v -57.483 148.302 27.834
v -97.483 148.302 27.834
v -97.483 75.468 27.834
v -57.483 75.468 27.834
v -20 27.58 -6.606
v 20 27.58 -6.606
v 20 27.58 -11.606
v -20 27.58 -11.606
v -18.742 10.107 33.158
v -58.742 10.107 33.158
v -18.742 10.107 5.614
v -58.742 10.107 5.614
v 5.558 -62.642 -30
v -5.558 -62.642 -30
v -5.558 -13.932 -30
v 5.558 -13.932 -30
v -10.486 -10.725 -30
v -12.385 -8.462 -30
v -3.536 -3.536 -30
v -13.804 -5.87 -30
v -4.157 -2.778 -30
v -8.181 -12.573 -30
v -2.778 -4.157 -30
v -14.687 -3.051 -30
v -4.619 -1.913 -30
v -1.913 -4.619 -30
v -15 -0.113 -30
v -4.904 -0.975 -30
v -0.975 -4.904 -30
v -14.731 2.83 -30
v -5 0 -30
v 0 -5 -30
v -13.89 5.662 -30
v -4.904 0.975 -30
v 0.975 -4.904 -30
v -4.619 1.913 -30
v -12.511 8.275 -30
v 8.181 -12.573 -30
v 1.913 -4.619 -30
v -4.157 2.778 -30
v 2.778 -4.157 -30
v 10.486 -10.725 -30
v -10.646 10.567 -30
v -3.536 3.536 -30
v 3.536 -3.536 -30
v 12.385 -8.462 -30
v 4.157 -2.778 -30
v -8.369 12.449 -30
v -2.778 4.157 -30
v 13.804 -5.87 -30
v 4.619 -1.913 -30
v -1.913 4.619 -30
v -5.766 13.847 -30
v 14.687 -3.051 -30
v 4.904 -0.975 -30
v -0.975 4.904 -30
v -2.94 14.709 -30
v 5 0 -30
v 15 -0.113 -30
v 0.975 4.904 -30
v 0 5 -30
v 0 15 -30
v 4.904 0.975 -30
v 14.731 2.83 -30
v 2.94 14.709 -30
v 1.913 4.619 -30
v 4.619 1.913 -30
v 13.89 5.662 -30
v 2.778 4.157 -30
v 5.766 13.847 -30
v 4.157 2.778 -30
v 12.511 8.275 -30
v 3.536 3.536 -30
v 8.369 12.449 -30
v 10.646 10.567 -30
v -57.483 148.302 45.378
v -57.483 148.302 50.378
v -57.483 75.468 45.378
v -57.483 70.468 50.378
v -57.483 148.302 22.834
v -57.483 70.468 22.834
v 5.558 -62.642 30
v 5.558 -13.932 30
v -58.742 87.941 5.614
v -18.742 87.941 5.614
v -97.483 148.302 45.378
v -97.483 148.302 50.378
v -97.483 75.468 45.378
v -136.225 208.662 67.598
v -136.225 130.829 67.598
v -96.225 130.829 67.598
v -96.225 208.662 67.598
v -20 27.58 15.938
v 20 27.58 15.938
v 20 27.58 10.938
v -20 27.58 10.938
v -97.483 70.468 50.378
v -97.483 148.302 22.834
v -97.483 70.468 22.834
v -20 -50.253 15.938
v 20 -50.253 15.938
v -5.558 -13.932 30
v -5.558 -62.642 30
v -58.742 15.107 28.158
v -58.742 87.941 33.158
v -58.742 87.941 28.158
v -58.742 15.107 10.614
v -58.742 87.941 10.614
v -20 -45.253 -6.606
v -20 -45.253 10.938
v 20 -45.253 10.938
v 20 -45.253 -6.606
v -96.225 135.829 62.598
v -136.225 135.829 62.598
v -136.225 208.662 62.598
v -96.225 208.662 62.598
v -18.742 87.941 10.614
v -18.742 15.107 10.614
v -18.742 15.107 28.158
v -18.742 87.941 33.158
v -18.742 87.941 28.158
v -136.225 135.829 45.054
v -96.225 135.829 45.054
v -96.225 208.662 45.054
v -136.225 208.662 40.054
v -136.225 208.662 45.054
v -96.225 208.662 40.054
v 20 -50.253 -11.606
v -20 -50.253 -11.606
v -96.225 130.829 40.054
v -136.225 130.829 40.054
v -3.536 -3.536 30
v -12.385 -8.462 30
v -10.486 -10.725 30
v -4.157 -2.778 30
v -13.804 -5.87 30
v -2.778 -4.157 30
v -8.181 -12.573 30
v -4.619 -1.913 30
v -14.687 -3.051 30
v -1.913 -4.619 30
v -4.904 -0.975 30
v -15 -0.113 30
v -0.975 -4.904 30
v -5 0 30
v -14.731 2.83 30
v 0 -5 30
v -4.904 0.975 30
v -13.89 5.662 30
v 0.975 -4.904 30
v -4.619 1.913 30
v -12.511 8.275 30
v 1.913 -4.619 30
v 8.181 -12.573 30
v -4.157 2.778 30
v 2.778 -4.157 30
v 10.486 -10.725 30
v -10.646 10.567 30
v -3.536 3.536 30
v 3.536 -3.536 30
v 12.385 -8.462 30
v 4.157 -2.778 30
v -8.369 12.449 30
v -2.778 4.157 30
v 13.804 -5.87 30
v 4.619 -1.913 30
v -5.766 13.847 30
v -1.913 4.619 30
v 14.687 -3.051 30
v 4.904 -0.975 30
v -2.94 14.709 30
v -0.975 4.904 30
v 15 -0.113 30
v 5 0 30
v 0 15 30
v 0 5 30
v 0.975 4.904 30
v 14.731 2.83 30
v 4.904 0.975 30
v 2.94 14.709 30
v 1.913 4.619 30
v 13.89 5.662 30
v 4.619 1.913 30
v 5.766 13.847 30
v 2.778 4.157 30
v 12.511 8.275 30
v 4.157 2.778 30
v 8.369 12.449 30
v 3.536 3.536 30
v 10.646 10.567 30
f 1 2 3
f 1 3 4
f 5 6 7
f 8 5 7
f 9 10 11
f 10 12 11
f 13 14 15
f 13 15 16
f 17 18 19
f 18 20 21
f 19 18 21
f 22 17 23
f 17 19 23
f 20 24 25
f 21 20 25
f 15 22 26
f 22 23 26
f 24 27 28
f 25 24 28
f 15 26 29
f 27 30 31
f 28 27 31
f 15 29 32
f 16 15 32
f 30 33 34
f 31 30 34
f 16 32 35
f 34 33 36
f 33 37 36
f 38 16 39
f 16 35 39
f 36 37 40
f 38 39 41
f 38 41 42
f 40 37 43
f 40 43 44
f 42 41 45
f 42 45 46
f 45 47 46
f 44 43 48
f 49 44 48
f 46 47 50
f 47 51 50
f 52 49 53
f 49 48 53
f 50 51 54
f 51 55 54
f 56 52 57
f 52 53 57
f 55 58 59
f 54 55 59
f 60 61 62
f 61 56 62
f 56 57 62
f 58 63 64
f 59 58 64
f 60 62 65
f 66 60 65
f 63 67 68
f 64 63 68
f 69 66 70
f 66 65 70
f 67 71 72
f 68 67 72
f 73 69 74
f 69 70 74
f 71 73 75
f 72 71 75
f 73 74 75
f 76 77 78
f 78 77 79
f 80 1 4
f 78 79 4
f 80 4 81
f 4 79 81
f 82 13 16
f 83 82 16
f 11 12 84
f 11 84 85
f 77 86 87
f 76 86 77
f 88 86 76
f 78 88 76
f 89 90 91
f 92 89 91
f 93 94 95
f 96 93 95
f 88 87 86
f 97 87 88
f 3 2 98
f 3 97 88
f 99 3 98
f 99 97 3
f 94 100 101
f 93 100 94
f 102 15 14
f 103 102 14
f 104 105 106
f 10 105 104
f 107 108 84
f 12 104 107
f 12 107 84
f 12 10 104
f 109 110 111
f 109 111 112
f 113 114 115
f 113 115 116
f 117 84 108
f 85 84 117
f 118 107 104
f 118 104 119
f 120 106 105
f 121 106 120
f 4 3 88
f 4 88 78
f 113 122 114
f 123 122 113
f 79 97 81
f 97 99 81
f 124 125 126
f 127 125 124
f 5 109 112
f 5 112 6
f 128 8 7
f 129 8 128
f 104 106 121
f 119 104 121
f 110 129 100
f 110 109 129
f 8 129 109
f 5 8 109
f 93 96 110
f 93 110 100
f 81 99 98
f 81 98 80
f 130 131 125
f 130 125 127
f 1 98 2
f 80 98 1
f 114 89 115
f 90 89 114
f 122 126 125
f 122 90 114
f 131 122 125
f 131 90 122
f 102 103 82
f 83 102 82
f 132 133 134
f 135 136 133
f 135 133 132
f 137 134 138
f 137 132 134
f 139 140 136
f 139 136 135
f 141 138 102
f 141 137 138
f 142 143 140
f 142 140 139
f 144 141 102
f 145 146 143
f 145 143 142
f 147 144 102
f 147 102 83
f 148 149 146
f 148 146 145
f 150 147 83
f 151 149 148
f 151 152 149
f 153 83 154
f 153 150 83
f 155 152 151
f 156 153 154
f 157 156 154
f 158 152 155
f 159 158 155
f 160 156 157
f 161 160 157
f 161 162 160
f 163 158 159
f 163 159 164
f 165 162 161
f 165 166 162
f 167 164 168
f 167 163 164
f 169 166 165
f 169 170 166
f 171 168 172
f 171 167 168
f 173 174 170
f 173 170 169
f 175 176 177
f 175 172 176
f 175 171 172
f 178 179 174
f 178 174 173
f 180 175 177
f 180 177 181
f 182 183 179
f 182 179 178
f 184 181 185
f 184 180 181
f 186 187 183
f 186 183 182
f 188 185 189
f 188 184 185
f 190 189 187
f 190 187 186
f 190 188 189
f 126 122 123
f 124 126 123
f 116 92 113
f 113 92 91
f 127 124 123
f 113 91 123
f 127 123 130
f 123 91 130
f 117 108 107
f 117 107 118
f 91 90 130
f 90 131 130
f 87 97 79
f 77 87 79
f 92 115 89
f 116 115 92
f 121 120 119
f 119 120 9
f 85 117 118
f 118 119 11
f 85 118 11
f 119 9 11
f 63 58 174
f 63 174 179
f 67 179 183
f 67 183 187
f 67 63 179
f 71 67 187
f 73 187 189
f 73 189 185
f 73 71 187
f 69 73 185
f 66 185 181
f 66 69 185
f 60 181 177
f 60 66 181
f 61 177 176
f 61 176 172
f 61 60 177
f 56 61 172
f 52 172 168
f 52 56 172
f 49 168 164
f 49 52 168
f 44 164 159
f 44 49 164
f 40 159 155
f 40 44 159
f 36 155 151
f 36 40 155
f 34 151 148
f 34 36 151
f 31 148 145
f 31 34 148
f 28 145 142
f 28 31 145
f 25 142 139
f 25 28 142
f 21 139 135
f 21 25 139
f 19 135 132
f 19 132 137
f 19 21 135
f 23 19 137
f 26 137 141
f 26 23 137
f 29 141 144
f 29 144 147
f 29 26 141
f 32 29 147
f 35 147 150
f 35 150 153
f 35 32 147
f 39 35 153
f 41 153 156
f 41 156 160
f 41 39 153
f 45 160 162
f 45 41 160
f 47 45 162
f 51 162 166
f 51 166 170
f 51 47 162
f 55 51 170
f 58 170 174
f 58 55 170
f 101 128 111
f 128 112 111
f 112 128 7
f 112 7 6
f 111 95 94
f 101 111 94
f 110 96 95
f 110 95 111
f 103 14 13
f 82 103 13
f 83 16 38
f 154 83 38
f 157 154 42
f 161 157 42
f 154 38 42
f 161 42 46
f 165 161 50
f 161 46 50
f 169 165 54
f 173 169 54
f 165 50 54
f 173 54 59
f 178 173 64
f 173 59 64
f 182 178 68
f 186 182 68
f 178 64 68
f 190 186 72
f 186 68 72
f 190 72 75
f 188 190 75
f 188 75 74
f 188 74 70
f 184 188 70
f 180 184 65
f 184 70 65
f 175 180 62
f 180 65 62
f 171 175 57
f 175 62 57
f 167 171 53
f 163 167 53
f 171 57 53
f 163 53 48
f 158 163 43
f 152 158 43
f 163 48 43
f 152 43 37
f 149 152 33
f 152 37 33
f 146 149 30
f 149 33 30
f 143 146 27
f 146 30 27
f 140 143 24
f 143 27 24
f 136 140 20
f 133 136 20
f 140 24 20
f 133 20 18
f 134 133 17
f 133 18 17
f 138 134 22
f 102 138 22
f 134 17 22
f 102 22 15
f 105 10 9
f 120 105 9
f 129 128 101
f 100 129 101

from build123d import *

# Parameters (mm, degrees)
EXTRUDE_5_DEPTH         = 30
EXTRUDE_5_DEPTH_BACK    = 30
F_1_FR_R                = 5
EXTRUDE_6_DEPTH         = 20
EXTRUDE_6_DEPTH_BACK    = 20
MOVE_START              = 130.828771523
MOVE_BODY_2_OUTLINE_W   = 40
MOVE_BODY_2_OUTLINE_H   = 5
MOVE_BODY_2_DEPTH       = 77.833611116
MOVE_BODY_2_2_OUTLINE_W = 40
MOVE_BODY_2_2_OUTLINE_H = 17.543632218
MOVE_BODY_2_2_DEPTH     = 5
MOVE_START_2            = 70.468132412
MOVE_BODY_2_3_OUTLINE_W = 40
MOVE_BODY_2_3_OUTLINE_H = 5
MOVE_BODY_2_3_DEPTH     = 77.833611116
MOVE_BODY_2_4_OUTLINE_W = 40
MOVE_BODY_2_4_OUTLINE_H = 17.543632219
MOVE_BODY_2_4_DEPTH     = 5
MOVE_START_3            = 10.107493301
MOVE_BODY_2_5_OUTLINE_W = 40
MOVE_BODY_2_5_OUTLINE_H = 5
MOVE_BODY_2_5_DEPTH     = 77.833611116
MOVE_BODY_2_6_OUTLINE_W = 40
MOVE_BODY_2_6_OUTLINE_H = 17.543632218
MOVE_BODY_2_6_DEPTH     = 5


# Read off the part's stored shape, not the designer's step: Тело-Переместить/Копировать2
with BuildPart() as part:
    # Эскиз1_fr → Бобышка-Вытянуть5 (new, two sides: drawn at the far end of the back side and taken through both)
    with BuildSketch(Plane.XY.offset(-EXTRUDE_5_DEPTH_BACK)):
        with BuildLine():
            Line((-5.557606452, -13.932444528), (-5.557606452, -62.642280008))
            Line((-5.557606452, -62.642280008), (5.557606452, -62.642280008))
            Line((5.557606452, -62.642280008), (5.557606452, -13.932444528))
            ThreePointArc((5.557606452, -13.932444528), (0, 15), (-5.557606452, -13.932444528))
        make_face()
        Circle(F_1_FR_R, mode=Mode.SUBTRACT)
    extrude(amount=EXTRUDE_5_DEPTH + EXTRUDE_5_DEPTH_BACK)


with BuildPart() as body_2:
    # Эскиз3 → Бобышка-Вытянуть6 (new, two sides: drawn at the far end of the back side and taken through both)
    with BuildSketch(Plane(origin=(0, 0, 0), x_dir=(0, 0, -1), z_dir=(1, 0, 0)).offset(-EXTRUDE_6_DEPTH_BACK)):
        Polygon((-58.394498043, -50.25314581), (-85.938130262, -50.25314581), (-85.938130262, 27.580465306), (-80.938130262, 27.580465306), (-80.938130262, -45.25314581), (-63.394498043, -45.25314581), (-63.394498043, 27.580465306), (-58.394498043, 27.580465306), align=None)
    extrude(amount=EXTRUDE_6_DEPTH + EXTRUDE_6_DEPTH_BACK)


with BuildPart() as body_2_1:
    # Move Body 1: moved
    add(body_2.part.moved(Location((0, 0, -70))))


with BuildPart() as body_3:
    # Move Body 2 outline → Move Body 2 (new body)
    with BuildSketch(Plane(origin=(0, 0, 0), x_dir=(1, 0, 0), z_dir=(0, 1, 0)).offset(MOVE_START)):
        with Locations((-116.225036109, -42.554191316)):
            Rectangle(MOVE_BODY_2_OUTLINE_W, MOVE_BODY_2_OUTLINE_H)
        with Locations((-116.225036109, -65.097823534)):
            Rectangle(MOVE_BODY_2_OUTLINE_W, MOVE_BODY_2_OUTLINE_H)
    extrude(amount=MOVE_BODY_2_DEPTH)

    # Move Body 2 2 outline → Move Body 2 2 (add)
    with BuildSketch(Plane(origin=(0, 0, 0), x_dir=(1, 0, 0), z_dir=(0, 1, 0)).offset(MOVE_START)):
        with Locations((-116.225036109, -53.826007425)):
            Rectangle(MOVE_BODY_2_2_OUTLINE_W, MOVE_BODY_2_2_OUTLINE_H)
    extrude(amount=MOVE_BODY_2_2_DEPTH)


with BuildPart() as body_4:
    # Move Body 2 3 outline → Move Body 2 3 (new body)
    with BuildSketch(Plane(origin=(0, 0, 0), x_dir=(1, 0, 0), z_dir=(0, 1, 0)).offset(MOVE_START_2)):
        with Locations((-77.483357406, -25.334293558)):
            Rectangle(MOVE_BODY_2_3_OUTLINE_W, MOVE_BODY_2_3_OUTLINE_H)
        with Locations((-77.483357406, -47.877925777)):
            Rectangle(MOVE_BODY_2_3_OUTLINE_W, MOVE_BODY_2_3_OUTLINE_H)
    extrude(amount=MOVE_BODY_2_3_DEPTH)

    # Move Body 2 4 outline → Move Body 2 4 (add)
    with BuildSketch(Plane(origin=(0, 0, 0), x_dir=(1, 0, 0), z_dir=(0, 1, 0)).offset(MOVE_START_2)):
        with Locations((-77.483357406, -36.606109668)):
            Rectangle(MOVE_BODY_2_4_OUTLINE_W, MOVE_BODY_2_4_OUTLINE_H)
    extrude(amount=MOVE_BODY_2_4_DEPTH)


with BuildPart() as body_5:
    # Move Body 2 5 outline → Move Body 2 5 (new body)
    with BuildSketch(Plane(origin=(0, 0, 0), x_dir=(1, 0, 0), z_dir=(0, 1, 0)).offset(MOVE_START_3)):
        with Locations((-38.741678703, -8.114395801)):
            Rectangle(MOVE_BODY_2_5_OUTLINE_W, MOVE_BODY_2_5_OUTLINE_H)
        with Locations((-38.741678703, -30.658028019)):
            Rectangle(MOVE_BODY_2_5_OUTLINE_W, MOVE_BODY_2_5_OUTLINE_H)
    extrude(amount=MOVE_BODY_2_5_DEPTH)

    # Move Body 2 6 outline → Move Body 2 6 (add)
    with BuildSketch(Plane(origin=(0, 0, 0), x_dir=(1, 0, 0), z_dir=(0, 1, 0)).offset(MOVE_START_3)):
        with Locations((-38.741678703, -19.38621191)):
            Rectangle(MOVE_BODY_2_6_OUTLINE_W, MOVE_BODY_2_6_OUTLINE_H)
    extrude(amount=MOVE_BODY_2_6_DEPTH)


solid = Compound([part.part, body_2_1.part, body_3.part, body_4.part, body_5.part])
